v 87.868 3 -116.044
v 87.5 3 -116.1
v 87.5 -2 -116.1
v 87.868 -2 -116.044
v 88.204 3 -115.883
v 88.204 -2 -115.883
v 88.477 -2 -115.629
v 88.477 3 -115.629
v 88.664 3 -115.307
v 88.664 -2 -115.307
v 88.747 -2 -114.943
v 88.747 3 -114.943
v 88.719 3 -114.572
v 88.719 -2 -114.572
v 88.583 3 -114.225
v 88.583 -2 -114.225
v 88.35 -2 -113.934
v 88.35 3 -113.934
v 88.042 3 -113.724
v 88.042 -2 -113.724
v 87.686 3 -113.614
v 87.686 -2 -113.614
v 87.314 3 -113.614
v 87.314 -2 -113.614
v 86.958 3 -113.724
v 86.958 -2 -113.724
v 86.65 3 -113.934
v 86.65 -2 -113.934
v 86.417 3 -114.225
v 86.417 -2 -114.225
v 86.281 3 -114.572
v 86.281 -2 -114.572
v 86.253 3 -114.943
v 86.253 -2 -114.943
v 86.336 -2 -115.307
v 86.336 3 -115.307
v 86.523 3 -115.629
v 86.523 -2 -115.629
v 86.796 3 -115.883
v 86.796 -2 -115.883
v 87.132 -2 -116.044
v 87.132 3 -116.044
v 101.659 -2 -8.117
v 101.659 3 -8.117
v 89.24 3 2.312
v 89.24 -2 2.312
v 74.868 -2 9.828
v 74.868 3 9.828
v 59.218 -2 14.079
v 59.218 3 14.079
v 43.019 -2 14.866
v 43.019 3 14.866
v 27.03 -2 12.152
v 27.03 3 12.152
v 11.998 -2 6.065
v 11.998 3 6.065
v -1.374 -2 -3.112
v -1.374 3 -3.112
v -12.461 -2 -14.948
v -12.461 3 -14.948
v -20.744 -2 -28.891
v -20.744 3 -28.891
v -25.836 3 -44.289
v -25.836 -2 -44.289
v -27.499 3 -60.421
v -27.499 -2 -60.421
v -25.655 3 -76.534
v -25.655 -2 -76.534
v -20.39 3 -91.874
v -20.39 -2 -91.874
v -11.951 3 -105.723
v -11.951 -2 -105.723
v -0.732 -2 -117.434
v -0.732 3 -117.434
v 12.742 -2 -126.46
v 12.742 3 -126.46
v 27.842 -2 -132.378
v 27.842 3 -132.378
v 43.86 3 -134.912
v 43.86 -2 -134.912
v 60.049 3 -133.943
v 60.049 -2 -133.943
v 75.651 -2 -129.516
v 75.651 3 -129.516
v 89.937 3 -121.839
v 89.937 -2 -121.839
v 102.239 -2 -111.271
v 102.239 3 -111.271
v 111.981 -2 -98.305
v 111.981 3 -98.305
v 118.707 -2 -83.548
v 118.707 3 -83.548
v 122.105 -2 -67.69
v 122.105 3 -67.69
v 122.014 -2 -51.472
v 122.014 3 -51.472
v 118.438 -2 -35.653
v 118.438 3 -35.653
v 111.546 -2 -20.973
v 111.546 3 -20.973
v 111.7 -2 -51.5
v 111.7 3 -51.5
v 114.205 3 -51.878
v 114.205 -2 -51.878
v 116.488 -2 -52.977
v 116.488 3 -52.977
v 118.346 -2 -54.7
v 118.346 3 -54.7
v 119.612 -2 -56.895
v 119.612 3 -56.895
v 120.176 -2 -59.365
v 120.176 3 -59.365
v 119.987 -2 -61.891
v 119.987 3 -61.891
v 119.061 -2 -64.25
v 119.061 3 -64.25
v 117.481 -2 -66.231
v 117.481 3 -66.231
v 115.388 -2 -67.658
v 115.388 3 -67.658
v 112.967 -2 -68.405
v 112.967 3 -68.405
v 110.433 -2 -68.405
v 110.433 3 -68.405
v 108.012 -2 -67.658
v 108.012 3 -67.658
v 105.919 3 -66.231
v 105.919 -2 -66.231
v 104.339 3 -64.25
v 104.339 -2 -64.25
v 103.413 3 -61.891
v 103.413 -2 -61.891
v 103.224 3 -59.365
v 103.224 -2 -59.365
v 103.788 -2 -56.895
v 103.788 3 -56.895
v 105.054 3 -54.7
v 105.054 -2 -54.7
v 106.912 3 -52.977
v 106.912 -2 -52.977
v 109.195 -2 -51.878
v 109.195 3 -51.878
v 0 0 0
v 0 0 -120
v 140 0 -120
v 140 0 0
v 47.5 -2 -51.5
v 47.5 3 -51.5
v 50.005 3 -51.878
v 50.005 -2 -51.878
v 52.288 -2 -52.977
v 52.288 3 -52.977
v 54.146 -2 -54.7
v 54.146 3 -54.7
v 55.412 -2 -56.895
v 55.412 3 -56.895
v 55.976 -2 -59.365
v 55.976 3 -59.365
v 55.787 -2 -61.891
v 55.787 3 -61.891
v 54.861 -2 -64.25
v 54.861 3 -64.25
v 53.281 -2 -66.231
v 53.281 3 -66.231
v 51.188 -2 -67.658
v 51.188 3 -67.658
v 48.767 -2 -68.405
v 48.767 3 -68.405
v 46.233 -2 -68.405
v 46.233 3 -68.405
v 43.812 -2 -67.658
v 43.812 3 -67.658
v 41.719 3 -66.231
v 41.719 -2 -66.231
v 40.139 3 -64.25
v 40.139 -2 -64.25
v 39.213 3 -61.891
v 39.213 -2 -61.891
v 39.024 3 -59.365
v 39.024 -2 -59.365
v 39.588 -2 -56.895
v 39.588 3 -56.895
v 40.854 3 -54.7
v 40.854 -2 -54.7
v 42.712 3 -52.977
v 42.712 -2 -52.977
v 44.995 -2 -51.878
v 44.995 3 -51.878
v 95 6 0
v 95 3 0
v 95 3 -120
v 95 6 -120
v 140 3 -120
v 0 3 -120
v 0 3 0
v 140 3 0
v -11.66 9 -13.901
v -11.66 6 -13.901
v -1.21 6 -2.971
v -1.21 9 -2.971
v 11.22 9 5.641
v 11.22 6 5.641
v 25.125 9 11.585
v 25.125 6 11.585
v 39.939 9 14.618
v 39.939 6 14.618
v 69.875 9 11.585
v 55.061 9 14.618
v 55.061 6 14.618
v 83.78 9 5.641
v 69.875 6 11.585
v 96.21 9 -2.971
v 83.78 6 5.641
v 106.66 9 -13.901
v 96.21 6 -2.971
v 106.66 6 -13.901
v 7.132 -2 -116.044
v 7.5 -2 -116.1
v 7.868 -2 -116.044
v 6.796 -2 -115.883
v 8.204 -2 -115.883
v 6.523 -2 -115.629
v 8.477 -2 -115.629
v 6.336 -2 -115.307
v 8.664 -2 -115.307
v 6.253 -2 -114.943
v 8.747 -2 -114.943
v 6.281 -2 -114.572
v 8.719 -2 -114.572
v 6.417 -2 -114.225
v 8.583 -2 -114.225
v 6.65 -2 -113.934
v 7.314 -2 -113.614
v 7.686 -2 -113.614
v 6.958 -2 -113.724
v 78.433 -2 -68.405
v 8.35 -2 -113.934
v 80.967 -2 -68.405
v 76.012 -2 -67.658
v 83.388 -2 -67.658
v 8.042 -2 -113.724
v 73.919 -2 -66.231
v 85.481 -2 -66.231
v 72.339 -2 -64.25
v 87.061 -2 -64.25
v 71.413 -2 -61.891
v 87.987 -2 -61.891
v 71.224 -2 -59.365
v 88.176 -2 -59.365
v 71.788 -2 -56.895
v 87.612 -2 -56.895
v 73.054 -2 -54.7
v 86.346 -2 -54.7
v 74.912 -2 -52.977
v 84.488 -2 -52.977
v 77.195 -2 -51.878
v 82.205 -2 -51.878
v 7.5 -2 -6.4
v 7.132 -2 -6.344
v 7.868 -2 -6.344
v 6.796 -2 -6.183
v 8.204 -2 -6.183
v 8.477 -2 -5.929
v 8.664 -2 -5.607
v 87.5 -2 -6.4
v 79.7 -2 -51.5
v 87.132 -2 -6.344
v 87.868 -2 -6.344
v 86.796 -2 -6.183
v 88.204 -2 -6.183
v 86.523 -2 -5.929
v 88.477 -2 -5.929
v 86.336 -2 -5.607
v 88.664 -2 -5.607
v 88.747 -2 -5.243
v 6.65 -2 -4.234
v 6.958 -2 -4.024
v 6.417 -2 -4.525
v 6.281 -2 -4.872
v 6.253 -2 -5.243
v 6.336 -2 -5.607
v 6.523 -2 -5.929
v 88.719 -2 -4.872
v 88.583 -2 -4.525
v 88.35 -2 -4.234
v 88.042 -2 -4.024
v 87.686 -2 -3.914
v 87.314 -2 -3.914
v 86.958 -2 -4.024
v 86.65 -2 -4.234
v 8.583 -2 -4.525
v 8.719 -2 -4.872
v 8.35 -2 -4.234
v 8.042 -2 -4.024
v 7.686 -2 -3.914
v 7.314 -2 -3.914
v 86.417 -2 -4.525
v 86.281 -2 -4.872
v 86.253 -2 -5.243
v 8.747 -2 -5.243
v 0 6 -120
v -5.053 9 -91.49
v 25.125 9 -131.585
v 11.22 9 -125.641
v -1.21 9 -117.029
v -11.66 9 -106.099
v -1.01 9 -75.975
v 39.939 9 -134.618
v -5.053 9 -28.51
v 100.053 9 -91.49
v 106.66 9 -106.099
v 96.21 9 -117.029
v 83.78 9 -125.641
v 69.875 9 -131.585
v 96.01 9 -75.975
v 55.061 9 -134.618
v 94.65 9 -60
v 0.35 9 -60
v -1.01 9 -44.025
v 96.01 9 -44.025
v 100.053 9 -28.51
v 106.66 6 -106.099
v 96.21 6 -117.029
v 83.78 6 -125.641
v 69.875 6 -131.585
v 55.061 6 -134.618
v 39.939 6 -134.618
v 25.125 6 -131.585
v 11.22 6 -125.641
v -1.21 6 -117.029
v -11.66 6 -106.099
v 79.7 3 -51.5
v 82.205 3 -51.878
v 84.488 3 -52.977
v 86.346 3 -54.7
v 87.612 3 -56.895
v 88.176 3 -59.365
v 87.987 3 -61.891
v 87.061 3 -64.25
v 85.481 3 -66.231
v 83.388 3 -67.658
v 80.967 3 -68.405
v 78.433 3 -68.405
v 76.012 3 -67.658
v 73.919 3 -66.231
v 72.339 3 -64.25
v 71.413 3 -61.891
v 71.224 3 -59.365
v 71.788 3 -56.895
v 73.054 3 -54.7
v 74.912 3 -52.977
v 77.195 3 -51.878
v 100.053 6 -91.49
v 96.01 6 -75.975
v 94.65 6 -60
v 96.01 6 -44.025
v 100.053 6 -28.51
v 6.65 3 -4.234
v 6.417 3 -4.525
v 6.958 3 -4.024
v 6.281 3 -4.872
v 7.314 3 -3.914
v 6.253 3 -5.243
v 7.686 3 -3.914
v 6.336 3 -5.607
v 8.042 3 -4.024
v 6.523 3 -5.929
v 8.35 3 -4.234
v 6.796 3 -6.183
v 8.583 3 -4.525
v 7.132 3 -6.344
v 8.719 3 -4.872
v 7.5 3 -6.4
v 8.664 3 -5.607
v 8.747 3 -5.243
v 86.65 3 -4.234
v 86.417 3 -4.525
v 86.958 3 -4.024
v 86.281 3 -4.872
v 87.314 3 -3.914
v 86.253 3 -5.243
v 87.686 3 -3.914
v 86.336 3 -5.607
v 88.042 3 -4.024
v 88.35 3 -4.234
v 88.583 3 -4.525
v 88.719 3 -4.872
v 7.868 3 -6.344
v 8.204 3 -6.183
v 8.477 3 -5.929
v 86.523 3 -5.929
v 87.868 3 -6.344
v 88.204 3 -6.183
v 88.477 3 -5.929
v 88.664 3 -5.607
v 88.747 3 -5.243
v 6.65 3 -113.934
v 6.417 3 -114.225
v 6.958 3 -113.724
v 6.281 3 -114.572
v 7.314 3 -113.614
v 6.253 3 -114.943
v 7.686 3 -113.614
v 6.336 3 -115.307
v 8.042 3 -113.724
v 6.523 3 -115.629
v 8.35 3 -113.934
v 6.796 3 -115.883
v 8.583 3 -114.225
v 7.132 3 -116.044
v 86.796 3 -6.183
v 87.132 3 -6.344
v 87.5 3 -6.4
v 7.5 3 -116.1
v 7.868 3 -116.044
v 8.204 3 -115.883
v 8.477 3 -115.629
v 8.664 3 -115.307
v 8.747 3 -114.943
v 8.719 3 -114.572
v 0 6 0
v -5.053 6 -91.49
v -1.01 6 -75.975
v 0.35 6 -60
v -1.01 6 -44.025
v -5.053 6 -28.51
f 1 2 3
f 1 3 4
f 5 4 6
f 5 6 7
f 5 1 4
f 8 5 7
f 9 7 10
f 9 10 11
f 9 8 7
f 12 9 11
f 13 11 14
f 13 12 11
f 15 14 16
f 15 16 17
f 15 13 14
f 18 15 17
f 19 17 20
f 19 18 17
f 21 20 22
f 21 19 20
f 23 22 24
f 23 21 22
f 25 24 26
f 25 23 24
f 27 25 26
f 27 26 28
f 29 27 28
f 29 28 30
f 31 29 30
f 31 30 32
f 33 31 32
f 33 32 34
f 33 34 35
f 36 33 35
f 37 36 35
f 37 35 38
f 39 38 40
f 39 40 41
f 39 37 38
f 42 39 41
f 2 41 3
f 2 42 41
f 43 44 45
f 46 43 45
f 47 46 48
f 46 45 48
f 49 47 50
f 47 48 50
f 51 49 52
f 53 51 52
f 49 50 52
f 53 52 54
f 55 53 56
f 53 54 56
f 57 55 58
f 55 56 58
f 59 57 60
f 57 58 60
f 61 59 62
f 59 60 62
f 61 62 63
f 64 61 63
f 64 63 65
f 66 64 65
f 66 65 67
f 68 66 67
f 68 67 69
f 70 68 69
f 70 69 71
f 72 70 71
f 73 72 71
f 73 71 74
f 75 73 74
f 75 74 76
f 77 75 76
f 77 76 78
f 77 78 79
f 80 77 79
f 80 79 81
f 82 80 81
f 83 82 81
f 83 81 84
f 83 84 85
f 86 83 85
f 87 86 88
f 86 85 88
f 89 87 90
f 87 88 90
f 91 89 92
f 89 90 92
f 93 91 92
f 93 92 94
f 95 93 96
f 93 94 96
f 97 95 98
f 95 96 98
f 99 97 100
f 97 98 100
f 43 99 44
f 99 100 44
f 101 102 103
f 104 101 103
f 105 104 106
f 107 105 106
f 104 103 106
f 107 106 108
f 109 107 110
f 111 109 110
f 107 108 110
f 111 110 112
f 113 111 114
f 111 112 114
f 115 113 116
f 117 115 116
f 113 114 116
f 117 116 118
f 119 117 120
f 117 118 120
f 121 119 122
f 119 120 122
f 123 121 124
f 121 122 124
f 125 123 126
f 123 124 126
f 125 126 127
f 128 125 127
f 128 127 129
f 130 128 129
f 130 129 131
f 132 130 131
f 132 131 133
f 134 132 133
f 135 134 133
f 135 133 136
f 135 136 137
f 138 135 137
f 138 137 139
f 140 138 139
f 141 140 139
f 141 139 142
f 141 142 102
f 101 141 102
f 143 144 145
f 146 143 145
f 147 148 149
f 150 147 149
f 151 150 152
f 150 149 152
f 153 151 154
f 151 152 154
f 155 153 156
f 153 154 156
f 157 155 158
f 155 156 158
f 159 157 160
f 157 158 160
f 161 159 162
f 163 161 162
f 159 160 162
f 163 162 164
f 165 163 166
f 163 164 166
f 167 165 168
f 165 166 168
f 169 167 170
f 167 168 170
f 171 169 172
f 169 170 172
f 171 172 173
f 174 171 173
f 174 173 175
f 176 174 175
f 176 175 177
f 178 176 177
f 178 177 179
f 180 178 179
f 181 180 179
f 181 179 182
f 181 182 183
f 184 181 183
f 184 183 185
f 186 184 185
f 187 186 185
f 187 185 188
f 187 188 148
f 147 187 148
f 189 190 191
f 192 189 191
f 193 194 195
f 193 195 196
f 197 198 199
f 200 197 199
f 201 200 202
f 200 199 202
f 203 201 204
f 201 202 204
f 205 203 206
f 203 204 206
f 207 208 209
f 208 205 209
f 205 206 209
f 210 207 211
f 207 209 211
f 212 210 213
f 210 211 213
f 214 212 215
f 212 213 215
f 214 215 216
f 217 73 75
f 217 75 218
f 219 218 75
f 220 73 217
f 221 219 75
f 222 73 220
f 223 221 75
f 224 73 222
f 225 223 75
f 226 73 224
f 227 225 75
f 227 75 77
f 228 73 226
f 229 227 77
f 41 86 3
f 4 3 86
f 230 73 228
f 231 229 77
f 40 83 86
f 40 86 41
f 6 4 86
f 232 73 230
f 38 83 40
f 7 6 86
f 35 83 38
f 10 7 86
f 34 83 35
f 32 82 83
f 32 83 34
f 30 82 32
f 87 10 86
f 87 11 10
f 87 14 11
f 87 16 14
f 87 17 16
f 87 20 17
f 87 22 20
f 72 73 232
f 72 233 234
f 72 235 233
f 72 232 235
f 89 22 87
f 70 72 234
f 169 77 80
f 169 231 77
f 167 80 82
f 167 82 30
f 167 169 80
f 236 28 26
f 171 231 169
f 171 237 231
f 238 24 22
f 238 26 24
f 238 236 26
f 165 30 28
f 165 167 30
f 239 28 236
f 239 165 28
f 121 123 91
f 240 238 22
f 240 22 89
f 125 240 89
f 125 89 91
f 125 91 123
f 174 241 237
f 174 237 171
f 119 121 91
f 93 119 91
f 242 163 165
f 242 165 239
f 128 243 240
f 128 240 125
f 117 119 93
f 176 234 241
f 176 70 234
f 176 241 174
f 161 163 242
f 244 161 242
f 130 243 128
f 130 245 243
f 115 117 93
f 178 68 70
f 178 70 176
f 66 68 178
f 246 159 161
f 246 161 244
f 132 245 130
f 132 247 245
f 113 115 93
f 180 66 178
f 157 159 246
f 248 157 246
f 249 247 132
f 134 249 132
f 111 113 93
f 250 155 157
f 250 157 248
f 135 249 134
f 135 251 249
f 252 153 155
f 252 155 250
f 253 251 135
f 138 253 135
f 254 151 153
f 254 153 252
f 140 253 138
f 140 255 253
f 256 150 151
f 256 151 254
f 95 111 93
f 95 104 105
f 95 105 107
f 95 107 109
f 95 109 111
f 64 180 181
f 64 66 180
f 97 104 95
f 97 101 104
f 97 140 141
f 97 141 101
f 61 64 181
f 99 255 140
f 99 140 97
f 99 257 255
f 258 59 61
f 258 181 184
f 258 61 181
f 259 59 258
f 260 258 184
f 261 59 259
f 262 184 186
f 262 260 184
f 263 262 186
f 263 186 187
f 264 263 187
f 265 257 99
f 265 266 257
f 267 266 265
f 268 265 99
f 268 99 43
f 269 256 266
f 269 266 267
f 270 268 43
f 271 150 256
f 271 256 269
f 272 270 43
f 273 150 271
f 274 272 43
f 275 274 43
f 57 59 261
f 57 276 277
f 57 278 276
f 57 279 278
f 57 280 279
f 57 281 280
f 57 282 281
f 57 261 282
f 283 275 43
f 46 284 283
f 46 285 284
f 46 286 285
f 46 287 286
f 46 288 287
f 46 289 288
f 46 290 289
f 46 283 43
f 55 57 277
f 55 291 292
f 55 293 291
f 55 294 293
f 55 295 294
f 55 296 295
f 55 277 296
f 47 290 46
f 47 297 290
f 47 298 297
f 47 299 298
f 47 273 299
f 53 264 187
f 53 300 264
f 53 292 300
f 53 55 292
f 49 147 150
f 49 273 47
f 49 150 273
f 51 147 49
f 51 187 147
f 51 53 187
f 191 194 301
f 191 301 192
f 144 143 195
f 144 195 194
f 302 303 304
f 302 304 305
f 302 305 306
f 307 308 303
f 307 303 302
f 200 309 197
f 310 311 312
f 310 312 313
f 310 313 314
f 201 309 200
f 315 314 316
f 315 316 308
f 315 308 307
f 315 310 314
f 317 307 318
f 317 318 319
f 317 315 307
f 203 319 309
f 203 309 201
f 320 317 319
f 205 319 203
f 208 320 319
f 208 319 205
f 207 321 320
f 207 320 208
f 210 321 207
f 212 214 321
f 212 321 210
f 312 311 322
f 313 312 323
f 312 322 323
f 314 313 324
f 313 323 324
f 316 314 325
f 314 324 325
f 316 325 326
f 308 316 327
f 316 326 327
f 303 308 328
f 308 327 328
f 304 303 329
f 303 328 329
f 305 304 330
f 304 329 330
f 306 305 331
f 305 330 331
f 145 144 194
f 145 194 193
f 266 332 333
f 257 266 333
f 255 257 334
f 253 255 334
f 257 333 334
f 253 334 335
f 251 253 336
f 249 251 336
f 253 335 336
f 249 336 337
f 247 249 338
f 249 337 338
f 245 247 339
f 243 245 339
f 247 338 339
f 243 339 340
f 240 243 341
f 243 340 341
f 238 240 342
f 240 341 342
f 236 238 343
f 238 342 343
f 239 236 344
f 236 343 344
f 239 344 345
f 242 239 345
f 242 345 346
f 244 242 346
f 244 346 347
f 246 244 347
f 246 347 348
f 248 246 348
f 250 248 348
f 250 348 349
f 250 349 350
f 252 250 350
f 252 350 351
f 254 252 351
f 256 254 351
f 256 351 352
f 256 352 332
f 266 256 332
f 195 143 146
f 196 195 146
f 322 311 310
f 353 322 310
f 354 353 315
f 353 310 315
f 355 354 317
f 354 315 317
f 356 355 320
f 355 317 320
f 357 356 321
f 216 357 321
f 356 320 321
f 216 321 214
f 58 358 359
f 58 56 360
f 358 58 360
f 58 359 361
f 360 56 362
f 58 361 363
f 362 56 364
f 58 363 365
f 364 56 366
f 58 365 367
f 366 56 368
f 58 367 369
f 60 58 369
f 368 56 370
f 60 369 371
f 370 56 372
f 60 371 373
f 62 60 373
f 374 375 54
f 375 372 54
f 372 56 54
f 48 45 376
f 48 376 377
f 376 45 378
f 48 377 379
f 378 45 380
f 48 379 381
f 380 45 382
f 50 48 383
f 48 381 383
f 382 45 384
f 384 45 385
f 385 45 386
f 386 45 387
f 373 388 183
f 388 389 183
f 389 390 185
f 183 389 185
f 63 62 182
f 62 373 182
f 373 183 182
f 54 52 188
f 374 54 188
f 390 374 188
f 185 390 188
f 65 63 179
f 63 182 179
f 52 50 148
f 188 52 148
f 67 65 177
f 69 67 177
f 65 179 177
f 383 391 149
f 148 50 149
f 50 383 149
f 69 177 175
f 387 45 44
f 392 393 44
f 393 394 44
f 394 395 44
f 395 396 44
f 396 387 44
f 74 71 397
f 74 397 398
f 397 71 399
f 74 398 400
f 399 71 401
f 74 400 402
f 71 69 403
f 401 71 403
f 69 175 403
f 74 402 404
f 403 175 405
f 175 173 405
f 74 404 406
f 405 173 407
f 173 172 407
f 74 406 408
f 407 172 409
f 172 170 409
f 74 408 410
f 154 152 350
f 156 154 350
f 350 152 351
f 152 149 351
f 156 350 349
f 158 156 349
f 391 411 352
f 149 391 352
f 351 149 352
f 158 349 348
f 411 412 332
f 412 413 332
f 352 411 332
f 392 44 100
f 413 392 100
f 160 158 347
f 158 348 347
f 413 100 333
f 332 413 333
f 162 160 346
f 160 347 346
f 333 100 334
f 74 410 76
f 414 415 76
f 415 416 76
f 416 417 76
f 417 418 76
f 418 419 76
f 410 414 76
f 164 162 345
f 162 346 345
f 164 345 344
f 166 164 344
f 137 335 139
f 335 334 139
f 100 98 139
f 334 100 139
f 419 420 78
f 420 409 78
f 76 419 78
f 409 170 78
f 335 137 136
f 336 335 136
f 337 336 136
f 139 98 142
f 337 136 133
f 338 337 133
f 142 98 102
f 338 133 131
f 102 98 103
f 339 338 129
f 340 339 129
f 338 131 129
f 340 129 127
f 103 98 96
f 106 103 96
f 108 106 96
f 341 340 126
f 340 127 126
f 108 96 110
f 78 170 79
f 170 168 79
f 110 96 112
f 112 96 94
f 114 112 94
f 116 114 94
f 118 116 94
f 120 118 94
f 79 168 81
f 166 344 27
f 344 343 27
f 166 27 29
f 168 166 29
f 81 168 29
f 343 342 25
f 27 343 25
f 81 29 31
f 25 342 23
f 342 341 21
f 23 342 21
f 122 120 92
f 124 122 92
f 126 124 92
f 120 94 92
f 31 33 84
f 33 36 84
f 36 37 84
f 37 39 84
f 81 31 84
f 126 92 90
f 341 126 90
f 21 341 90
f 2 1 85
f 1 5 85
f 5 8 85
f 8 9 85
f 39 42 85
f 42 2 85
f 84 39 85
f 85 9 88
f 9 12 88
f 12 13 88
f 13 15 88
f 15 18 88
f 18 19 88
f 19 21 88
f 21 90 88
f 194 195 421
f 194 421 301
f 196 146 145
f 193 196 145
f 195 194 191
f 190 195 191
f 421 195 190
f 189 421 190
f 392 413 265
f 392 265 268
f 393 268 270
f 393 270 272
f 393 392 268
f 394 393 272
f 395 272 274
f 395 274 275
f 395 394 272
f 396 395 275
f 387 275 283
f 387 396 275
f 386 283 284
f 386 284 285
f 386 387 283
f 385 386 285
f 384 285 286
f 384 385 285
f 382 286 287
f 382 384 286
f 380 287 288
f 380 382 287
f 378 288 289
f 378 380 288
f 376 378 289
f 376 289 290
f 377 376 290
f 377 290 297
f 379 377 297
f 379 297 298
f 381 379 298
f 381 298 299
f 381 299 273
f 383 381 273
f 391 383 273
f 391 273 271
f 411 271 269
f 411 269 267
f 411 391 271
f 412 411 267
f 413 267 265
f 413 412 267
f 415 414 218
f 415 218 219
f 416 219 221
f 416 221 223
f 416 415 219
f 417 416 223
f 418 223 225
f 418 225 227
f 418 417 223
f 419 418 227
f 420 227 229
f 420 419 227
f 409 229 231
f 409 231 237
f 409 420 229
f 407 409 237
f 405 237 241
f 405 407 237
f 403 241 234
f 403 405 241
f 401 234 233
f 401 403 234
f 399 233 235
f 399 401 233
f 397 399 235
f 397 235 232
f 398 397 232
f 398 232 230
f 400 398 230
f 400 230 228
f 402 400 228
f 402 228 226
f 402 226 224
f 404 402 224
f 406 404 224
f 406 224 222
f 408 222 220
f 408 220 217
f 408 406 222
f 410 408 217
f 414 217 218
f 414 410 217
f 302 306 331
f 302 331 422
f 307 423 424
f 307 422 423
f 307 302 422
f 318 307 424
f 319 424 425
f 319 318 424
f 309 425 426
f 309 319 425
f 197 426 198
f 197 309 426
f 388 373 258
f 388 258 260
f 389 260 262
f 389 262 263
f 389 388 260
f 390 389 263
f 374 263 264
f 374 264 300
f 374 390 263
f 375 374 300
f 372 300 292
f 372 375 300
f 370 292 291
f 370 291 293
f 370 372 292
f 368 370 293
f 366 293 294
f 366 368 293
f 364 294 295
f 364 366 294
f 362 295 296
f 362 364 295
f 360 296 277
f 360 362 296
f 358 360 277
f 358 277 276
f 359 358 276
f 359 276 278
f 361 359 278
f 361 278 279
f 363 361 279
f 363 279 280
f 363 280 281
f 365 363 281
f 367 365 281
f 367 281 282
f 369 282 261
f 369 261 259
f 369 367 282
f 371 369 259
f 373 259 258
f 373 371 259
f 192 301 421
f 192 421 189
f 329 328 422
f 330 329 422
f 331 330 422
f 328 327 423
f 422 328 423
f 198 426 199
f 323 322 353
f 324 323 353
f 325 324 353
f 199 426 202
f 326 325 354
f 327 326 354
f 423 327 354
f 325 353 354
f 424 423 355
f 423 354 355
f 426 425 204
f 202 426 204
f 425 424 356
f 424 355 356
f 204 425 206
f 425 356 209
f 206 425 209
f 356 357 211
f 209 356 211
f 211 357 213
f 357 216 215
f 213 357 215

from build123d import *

# Parameters (mm, degrees)
SKETCH1_W                   = 140
SKETCH1_H                   = 120
COMPACT_DEPTH               = 3
SKETCH4_W                   = 95
SKETCH4_H                   = 120
SUPERCOMPACT_DEPTH          = 3
SKETCH7_R                   = 75
APPLE_BASE_DEPTH            = 3
SIDECUTS_DEPTH              = 195.694632694
APPLE_BASE_2_DEPTH          = 3
BOSS_EXTRUDE4_DEPTH         = 3
BASE_PLATE_FILLET_R         = 0.001
TOP_BOTTOM_EXTENSIONS_DEPTH = 3
SKETCH35_R                  = 1.25
SPACERHOLES_DEPTH           = 10
CUT_EXTRUDE4_DEPTH          = 10
SKETCH39_R                  = 75
SKETCH39_R_2                = 1.25
BOSS_EXTRUDE5_DEPTH         = 5
CUT_EXTRUDE5_DEPTH          = 150
SKETCH41_R                  = 8.5
CUT_EXTRUDE6_DEPTH          = 10
SKETCH44_R                  = 8.5
CUT_EXTRUDE7_DEPTH          = 10


with BuildPart() as part:
    # Sketch1 → Compact (new body)
    with BuildSketch(Plane(origin=(0, 0, 0), x_dir=(1, 0, 0), z_dir=(0, 1, 0))):
        with Locations((70, 60)):
            Rectangle(SKETCH1_W, SKETCH1_H)
    extrude(amount=COMPACT_DEPTH)


with BuildPart() as body_2:
    # Sketch4 → SuperCompact (new body)
    with BuildSketch(Plane(origin=(0, 3, 0), x_dir=(1, 0, 0), z_dir=(0, 1, 0))):
        with Locations((47.5, 60)):
            Rectangle(SKETCH4_W, SKETCH4_H)
    extrude(amount=SUPERCOMPACT_DEPTH)


with BuildPart() as body_3:
    # Sketch7 → Apple Base (new body)
    with BuildSketch(Plane(origin=(0, 6, 0), x_dir=(1, 0, 0), z_dir=(0, 1, 0))):
        with Locations(Location((47.5, 60, 0), (0, 0, 270))):
            Circle(SKETCH7_R)
    extrude(amount=APPLE_BASE_DEPTH)

    # Sketch8 → SideCuts (cut, through all)
    with BuildSketch(Plane(origin=(0, 9, 0), x_dir=(1, 0, 0), z_dir=(0, 1, 0))):
        with BuildLine():
            ThreePointArc((-11.66, 106.098746187), (0.350007958, 60), (-11.66, 13.901253813))
            ThreePointArc((-11.66, 13.901253813), (-27.5, 60), (-11.66, 106.098746187))
        make_face()
        with BuildLine():
            ThreePointArc((106.66, 106.098746187), (94.649992042, 60), (106.66, 13.901253813))
            ThreePointArc((106.66, 13.901253813), (122.5, 60), (106.66, 106.098746187))
        make_face()
    extrude(amount=-SIDECUTS_DEPTH, mode=Mode.SUBTRACT)


with BuildPart() as body_4:
    # Sketch9 → Apple_Base 2 (new body)
    with BuildSketch(Plane.XZ.offset(-6)):
        with BuildLine():
            ThreePointArc((106.66, -13.901253813), (47.5, 15), (-11.66, -13.901253813))
            ThreePointArc((-11.66, -13.901253813), (0.350007958, -60), (-11.66, -106.098746187))
            ThreePointArc((-11.66, -106.098746187), (47.5, -135), (106.66, -106.098746187))
            ThreePointArc((106.66, -106.098746187), (94.649992042, -60), (106.66, -13.901253813))
        make_face()
    extrude(amount=APPLE_BASE_2_DEPTH)

    # Sketch10 → Boss-Extrude4 (add)
    with BuildSketch(Plane(origin=(0, 6, 0), x_dir=(1, 0, 0), z_dir=(0, 1, 0))):
        with BuildLine():
            Line((-11.66, 106.098746187), (-11.66, 13.901253813))
            ThreePointArc((-11.66, 13.901253813), (0.350007958, 60), (-11.66, 106.098746187))
        make_face()
        with BuildLine():
            Line((106.66, 106.098746187), (106.66, 13.901253813))
            ThreePointArc((106.66, 13.901253813), (94.649992042, 60), (106.66, 106.098746187))
        make_face()
    extrude(amount=-BOSS_EXTRUDE4_DEPTH)

    # Base_Plate_Fillet
    base_plate_fillet_edges = [body_4.edges().sort_by_distance(p)[0] for p in [
        (-11.66, 3, -60),
        (-11.66, 6, -60),
        (47.5, 3, -135),
        (106.66, 3, -60),
        (106.66, 6, -60),
        (47.5, 6, -135),
        (47.5, 6, 15),
        (106.66, 4.5, -106.098746187),
        (-11.66, 4.5, -106.098746187),
        (-11.66, 4.5, -13.901253813),
        (106.66, 4.5, -13.901253813),
        (47.5, 3, 15),
    ]]
    fillet(base_plate_fillet_edges, radius=BASE_PLATE_FILLET_R)

    # Sketch25 → Top Bottom extensions (add)
    with BuildSketch(Plane(origin=(0, 6, 0), x_dir=(1, 0, 0), z_dir=(0, 1, 0))):
        with BuildLine():
            Line((-11.659005821, 106.097402592), (-11.659005821, 111.097402592))
            ThreePointArc((-11.659005821, 111.097402592), (47.5, 138.794628322), (106.659005821, 111.097402592))
            Line((106.659005821, 111.097402592), (106.659005821, 106.097402592))
            ThreePointArc((106.659005821, 106.097402592), (47.5, 133.794628322), (-11.659005821, 106.097402592))
        make_face()
        with BuildLine():
            Line((106.659005821, 13.902597408), (106.659005821, 8.902597408))
            ThreePointArc((106.659005821, 8.902597408), (47.5, -18.794628322), (-11.659005821, 8.902597408))
            Line((-11.659005821, 8.902597408), (-11.659005821, 13.902597408))
            ThreePointArc((-11.659005821, 13.902597408), (47.5, -13.794628322), (106.659005821, 13.902597408))
        make_face()
    extrude(amount=-TOP_BOTTOM_EXTENSIONS_DEPTH)

    # Sketch35 → SpacerHoles (cut)
    with BuildSketch(Plane.XZ.offset(-3)):
        with Locations(Location((7.5, -5.15, 0), (0, 0, 270))):
            Circle(SKETCH35_R)
        with Locations(Location((87.5, -5.15, 0), (0, 0, 270))):
            Circle(SKETCH35_R)
        with Locations(Location((87.5, -114.85, 0), (0, 0, 270))):
            Circle(SKETCH35_R)
        with Locations(Location((7.5, -114.85, 0), (0, 0, 270))):
            Circle(SKETCH35_R)
    extrude(amount=-SPACERHOLES_DEPTH, mode=Mode.SUBTRACT)

    # Sketch38 → Cut-Extrude4 (cut)
    with BuildSketch(Plane.XZ.offset(-3)):
        Polygon((47.5, 37.050137759), (120.372278362, 37.050137759), (120.372278362, -158.601845129), (-29.177494987, -158.601845129), (-29.177494987, 37.050137759), align=None)
        Polygon((-6.659, -60), (-6.659, 24.702355976), (101.659, 24.702355976), (101.659, -143.843523469), (-6.659, -143.843523469), align=None, mode=Mode.SUBTRACT)
    extrude(amount=-CUT_EXTRUDE4_DEPTH, mode=Mode.SUBTRACT)

    # Sketch39 → Boss-Extrude5 (add)
    with BuildSketch(Plane.XZ.offset(-3)):
        with Locations(Location((47.5, -60, 0), (0, 0, 43.770209918))):
            Circle(SKETCH39_R)
        with Locations(Location((87.5, -5.15, 0), (0, 0, 270))):
            Circle(SKETCH39_R_2, mode=Mode.SUBTRACT)
        with Locations(Location((7.5, -5.15, 0), (0, 0, 270))):
            Circle(SKETCH39_R_2, mode=Mode.SUBTRACT)
        with Locations(Location((7.5, -114.85, 0), (0, 0, 270))):
            Circle(SKETCH39_R_2, mode=Mode.SUBTRACT)
        with Locations(Location((87.5, -114.85, 0), (0, 0, 270))):
            Circle(SKETCH39_R_2, mode=Mode.SUBTRACT)
    extrude(amount=BOSS_EXTRUDE5_DEPTH)

    # Sketch40 → Cut-Extrude5 (cut)
    with BuildSketch(Plane(origin=(101.659, 0, 0), x_dir=(0, 0, -1), z_dir=(1, 0, 0))):
        Polygon((3.460058054, 3), (-22.733784582, 3), (-22.733784582, 8.214035789), (147.50303534, 8.214035789), (147.50303534, 3), align=None)
    extrude(amount=-CUT_EXTRUDE5_DEPTH, mode=Mode.SUBTRACT)

    # Sketch41 → Cut-Extrude6 (cut)
    with BuildSketch(Plane(origin=(0, 3, 0), x_dir=(1, 0, 0), z_dir=(0, 1, 0))):
        with Locations(Location((47.5, 60, 0), (0, 0, 270))):
            Circle(SKETCH41_R)
        with Locations(Location((79.7, 60, 0), (0, 0, 270))):
            Circle(SKETCH41_R)
    extrude(amount=-CUT_EXTRUDE6_DEPTH, mode=Mode.SUBTRACT)

    # Sketch44 → Cut-Extrude7 (cut)
    with BuildSketch(Plane(origin=(0, 3, 0), x_dir=(1, 0, 0), z_dir=(0, 1, 0))):
        with Locations(Location((111.7, 60, 0), (0, 0, 270))):
            Circle(SKETCH44_R)
    extrude(amount=-CUT_EXTRUDE7_DEPTH, mode=Mode.SUBTRACT)


solid = Compound([part.part, body_2.part, body_3.part, body_4.part])
